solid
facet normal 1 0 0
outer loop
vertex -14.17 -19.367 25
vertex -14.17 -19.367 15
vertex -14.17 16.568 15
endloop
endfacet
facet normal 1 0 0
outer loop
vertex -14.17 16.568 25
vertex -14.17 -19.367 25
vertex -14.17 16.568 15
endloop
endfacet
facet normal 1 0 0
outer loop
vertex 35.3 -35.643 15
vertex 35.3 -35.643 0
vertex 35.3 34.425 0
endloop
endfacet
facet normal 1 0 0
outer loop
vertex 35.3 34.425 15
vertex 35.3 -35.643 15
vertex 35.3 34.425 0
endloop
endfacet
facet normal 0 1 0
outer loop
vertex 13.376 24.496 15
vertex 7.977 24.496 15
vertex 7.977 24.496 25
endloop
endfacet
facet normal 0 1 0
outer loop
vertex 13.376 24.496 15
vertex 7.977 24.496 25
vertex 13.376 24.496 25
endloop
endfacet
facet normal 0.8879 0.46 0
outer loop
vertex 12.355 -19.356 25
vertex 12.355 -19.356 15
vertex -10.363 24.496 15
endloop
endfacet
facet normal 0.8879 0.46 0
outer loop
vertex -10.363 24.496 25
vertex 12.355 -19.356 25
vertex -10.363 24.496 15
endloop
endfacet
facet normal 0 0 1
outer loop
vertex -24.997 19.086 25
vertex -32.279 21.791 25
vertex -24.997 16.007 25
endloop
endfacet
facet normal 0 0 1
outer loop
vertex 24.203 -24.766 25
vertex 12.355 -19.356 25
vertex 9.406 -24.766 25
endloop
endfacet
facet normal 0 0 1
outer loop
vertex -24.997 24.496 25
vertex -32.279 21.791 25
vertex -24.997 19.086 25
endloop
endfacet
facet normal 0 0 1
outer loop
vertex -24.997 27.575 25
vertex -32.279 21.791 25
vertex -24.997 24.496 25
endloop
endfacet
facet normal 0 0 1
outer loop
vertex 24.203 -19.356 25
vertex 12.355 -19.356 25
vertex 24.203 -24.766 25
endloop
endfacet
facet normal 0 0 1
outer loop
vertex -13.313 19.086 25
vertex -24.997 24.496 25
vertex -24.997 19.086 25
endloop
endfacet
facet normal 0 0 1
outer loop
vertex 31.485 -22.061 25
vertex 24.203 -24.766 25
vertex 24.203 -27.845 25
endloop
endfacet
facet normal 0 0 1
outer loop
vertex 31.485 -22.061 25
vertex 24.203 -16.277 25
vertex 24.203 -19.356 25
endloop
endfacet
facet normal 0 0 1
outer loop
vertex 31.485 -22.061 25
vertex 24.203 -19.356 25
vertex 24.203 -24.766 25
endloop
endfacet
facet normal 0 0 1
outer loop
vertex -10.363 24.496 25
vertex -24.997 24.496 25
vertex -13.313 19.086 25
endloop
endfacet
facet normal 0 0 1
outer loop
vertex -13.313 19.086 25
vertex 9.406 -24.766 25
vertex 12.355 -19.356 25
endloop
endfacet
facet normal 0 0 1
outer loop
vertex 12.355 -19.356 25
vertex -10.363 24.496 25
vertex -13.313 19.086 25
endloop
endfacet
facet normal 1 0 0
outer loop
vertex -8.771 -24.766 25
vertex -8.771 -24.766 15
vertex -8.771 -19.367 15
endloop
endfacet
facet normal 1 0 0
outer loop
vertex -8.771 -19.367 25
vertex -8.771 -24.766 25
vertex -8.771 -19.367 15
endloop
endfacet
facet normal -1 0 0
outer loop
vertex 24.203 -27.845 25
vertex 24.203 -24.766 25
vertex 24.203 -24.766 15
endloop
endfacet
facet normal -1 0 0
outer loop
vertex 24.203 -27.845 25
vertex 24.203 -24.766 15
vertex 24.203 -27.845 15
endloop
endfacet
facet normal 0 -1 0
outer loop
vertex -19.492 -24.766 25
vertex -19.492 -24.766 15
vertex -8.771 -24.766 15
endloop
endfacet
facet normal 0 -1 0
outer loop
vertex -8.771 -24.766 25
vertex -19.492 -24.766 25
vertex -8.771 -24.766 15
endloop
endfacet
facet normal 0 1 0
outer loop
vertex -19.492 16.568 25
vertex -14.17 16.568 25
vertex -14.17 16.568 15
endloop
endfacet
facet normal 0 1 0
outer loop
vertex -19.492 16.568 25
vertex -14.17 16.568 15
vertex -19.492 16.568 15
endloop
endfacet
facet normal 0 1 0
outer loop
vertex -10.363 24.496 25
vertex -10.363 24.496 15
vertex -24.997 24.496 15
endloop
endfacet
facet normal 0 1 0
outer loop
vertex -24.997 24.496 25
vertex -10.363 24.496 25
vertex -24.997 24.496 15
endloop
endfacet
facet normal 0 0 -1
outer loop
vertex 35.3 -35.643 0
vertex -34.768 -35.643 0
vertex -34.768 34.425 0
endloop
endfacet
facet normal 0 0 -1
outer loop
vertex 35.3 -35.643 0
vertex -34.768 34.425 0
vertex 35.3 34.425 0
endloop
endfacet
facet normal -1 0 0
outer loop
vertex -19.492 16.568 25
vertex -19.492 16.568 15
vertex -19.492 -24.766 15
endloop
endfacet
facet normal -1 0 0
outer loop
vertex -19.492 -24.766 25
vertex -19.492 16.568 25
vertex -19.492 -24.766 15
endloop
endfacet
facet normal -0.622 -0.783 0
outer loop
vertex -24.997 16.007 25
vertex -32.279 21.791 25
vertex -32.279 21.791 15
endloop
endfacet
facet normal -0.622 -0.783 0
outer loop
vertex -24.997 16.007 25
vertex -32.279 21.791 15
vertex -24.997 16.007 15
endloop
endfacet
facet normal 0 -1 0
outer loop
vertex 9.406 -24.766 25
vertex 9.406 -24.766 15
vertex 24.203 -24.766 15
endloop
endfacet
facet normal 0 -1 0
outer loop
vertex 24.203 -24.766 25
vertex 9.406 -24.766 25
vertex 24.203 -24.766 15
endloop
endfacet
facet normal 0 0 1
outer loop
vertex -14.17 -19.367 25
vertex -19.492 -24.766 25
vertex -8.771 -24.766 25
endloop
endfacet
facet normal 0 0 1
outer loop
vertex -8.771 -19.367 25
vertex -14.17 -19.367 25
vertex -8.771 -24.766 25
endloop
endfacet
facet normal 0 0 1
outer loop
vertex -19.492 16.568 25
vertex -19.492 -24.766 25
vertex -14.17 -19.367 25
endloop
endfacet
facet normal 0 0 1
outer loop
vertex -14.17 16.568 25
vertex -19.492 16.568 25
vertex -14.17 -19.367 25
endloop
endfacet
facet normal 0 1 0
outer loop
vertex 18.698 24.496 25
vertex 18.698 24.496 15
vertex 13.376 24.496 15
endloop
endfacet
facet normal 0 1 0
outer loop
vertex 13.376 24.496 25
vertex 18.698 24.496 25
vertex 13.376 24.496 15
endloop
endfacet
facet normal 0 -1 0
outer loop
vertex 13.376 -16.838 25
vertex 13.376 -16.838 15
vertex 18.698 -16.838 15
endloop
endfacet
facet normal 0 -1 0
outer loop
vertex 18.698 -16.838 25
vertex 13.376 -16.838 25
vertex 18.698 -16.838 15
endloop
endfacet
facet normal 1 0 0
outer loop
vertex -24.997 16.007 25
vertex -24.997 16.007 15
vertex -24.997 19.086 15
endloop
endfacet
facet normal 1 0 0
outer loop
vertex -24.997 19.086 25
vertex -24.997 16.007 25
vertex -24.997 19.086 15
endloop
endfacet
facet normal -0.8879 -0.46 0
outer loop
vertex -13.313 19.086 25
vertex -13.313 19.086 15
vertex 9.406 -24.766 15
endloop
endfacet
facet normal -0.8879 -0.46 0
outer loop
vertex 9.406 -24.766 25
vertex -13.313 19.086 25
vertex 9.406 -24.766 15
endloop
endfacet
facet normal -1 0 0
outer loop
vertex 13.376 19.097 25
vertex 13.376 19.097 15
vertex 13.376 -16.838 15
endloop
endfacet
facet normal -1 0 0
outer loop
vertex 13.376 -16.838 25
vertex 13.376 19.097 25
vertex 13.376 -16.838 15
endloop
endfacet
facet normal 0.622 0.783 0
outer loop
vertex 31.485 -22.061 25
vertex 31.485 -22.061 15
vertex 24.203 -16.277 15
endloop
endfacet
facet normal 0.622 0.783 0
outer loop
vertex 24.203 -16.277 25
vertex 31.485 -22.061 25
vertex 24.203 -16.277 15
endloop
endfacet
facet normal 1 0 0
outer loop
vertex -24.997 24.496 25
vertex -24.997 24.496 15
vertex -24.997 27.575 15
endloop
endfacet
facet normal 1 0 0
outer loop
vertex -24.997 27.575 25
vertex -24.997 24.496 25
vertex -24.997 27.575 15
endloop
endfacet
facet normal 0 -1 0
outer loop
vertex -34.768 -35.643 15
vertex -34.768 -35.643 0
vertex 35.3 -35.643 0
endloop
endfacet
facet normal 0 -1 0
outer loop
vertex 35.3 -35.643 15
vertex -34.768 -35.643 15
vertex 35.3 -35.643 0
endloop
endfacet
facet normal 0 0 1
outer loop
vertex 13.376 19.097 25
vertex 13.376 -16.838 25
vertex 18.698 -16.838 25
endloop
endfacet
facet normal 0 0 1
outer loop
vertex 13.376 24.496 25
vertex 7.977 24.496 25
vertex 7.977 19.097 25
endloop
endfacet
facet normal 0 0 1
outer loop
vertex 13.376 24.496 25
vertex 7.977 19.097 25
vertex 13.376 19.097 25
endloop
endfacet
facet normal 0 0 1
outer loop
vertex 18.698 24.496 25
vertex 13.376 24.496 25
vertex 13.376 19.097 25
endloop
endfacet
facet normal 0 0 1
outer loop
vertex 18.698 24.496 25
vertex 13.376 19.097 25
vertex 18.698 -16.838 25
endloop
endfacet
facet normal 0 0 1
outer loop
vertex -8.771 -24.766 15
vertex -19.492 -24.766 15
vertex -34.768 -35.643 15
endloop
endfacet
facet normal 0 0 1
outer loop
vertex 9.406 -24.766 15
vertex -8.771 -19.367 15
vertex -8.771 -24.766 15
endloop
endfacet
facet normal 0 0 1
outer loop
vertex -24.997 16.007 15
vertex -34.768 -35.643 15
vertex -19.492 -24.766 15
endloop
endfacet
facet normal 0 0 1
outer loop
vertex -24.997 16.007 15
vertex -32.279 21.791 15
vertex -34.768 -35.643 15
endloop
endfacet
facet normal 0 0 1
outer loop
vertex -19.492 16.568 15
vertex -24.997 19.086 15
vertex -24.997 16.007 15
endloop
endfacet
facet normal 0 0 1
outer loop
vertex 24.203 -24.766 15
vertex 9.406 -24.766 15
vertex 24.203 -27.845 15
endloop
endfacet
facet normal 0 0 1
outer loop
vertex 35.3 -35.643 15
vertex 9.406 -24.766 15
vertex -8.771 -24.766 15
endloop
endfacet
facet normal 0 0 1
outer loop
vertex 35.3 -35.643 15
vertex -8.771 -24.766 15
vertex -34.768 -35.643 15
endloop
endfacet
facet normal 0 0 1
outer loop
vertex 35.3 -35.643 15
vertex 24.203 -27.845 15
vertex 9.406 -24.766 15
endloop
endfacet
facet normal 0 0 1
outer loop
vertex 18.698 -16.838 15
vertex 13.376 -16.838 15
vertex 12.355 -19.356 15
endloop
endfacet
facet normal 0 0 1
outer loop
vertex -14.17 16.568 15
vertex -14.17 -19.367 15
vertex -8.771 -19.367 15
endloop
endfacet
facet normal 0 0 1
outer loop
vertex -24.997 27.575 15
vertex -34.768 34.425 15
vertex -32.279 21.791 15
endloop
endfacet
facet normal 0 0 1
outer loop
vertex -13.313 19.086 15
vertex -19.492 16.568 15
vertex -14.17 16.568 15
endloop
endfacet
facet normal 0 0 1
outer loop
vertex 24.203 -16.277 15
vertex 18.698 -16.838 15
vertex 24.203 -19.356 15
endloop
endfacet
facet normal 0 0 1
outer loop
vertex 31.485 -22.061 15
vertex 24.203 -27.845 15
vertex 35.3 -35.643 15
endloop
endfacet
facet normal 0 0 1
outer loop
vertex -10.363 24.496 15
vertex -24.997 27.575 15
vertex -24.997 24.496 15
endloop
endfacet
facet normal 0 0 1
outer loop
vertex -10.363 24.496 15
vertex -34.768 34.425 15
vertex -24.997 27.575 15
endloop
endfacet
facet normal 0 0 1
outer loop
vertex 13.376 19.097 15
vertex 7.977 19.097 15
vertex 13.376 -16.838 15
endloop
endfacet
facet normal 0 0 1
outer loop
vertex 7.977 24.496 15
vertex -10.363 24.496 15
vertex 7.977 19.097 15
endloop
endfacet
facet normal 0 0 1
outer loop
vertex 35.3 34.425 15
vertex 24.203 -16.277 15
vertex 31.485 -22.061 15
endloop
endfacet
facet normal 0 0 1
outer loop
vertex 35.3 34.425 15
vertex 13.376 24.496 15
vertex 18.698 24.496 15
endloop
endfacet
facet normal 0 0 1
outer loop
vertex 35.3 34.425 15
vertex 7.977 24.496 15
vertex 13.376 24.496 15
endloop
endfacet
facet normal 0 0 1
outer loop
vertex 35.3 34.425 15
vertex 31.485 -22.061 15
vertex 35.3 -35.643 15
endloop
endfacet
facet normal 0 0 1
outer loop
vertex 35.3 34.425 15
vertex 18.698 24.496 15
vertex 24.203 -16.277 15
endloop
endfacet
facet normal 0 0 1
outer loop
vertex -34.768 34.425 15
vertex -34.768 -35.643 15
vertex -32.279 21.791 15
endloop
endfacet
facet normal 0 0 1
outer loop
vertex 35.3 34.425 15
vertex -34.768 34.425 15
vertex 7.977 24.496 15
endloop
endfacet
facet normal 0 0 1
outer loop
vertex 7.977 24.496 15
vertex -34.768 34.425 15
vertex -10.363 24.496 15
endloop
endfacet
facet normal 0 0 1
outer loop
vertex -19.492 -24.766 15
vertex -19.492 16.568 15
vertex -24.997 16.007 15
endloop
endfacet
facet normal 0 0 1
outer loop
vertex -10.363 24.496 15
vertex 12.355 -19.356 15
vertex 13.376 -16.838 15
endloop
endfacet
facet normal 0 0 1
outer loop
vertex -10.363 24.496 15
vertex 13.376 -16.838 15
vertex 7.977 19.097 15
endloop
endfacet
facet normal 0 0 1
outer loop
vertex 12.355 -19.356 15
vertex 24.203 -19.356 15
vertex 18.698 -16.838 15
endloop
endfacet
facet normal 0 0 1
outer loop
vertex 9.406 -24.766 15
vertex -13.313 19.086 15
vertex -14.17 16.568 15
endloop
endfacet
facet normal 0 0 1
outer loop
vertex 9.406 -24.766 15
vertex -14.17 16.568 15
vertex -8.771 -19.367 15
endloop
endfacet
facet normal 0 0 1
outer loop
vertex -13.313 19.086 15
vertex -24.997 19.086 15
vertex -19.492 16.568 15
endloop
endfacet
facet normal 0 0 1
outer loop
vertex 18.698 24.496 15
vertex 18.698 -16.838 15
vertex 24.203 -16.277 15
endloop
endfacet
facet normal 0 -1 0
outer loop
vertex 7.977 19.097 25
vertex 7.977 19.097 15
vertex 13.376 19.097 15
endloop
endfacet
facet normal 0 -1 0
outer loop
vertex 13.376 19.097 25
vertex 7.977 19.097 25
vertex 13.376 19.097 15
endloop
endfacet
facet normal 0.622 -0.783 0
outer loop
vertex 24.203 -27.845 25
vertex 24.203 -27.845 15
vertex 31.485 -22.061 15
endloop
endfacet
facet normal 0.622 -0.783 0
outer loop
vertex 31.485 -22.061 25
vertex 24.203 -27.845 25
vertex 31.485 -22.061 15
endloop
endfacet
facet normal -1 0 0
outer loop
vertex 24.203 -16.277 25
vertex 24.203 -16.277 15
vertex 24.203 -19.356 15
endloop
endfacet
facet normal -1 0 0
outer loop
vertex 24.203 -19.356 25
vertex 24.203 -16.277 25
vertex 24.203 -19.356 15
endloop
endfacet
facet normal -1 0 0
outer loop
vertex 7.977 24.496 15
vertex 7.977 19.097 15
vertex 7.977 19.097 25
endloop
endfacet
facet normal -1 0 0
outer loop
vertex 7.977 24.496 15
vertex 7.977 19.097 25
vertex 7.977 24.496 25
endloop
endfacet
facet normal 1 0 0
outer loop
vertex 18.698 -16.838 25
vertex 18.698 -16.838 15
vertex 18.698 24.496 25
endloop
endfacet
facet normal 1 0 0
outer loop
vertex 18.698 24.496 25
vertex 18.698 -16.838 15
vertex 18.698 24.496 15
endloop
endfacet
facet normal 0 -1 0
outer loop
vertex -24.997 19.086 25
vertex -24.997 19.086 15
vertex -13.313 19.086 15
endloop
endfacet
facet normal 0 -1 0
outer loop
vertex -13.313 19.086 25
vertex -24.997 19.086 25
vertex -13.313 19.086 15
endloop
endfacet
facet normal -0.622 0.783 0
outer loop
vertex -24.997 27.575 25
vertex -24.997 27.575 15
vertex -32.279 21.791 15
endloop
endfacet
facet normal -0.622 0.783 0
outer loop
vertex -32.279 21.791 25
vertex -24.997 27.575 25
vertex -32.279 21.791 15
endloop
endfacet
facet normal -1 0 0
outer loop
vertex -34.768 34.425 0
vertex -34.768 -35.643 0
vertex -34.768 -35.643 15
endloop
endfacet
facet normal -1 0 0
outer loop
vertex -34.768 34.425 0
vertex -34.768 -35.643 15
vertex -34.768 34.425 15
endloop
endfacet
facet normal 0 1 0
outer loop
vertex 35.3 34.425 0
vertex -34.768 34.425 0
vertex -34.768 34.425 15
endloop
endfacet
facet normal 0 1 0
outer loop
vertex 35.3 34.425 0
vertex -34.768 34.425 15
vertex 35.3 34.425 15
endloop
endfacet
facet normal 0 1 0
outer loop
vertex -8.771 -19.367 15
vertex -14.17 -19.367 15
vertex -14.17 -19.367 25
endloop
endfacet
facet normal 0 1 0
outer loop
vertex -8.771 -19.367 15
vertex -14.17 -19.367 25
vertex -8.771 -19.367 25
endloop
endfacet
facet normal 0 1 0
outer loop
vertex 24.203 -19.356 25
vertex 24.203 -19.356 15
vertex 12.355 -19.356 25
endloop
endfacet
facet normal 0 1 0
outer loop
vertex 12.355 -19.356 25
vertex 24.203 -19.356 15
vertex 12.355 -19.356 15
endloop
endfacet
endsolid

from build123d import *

# Parameters (mm, degrees)
F0_W     = 70.067666
F0_H     = 70.067667
F2_DEPTH = 15
F1_W     = 5.398806
F1_H     = 5.399308
F1_H_2   = 5.399307
F3_DEPTH = 25


with BuildPart() as f2:
    # F0 (on Top) → F2 (new body)
    with BuildSketch(Plane.XY):
        with Locations((0.265833, -0.609237)):
            Rectangle(F0_W, F0_H)
    extrude(amount=F2_DEPTH)

    # F1 (on Top) → F3 (join)
    with BuildSketch(Plane.XY):
        Polygon((-14.17026, 16.568485), (-19.4919, 16.568485), (-19.4919, -24.765937), (-14.17026, -24.765937), (-14.17026, -19.366629), align=None)
        with Locations((-11.470857, -22.066283)):
            Rectangle(F1_W, F1_H)
        Polygon((-10.363362, 24.496303), (-19.585205, 24.496303), (-24.996936, 24.496303), (-24.996936, 27.575392), (-32.27913, 21.791303), (-24.996936, 16.007215), (-24.996936, 19.086303), (-19.585205, 19.086303), (-13.312519, 19.086303), (9.406068, -24.765937), (18.790985, -24.765937), (24.202717, -24.765937), (24.202717, -27.845025), (31.48491, -22.060937), (24.202717, -16.276848), (24.202717, -19.355937), (18.790985, -19.355937), (12.355225, -19.355937), align=None)
        Polygon((13.37604, -16.838118), (18.69768, -16.838118), (18.69768, 24.496303), (13.37604, 24.496303), (13.37604, 19.096996), align=None)
        with Locations((10.676637, 21.79665)):
            Rectangle(F1_W, F1_H_2)
    extrude(amount=F3_DEPTH)


solid = f2.part
